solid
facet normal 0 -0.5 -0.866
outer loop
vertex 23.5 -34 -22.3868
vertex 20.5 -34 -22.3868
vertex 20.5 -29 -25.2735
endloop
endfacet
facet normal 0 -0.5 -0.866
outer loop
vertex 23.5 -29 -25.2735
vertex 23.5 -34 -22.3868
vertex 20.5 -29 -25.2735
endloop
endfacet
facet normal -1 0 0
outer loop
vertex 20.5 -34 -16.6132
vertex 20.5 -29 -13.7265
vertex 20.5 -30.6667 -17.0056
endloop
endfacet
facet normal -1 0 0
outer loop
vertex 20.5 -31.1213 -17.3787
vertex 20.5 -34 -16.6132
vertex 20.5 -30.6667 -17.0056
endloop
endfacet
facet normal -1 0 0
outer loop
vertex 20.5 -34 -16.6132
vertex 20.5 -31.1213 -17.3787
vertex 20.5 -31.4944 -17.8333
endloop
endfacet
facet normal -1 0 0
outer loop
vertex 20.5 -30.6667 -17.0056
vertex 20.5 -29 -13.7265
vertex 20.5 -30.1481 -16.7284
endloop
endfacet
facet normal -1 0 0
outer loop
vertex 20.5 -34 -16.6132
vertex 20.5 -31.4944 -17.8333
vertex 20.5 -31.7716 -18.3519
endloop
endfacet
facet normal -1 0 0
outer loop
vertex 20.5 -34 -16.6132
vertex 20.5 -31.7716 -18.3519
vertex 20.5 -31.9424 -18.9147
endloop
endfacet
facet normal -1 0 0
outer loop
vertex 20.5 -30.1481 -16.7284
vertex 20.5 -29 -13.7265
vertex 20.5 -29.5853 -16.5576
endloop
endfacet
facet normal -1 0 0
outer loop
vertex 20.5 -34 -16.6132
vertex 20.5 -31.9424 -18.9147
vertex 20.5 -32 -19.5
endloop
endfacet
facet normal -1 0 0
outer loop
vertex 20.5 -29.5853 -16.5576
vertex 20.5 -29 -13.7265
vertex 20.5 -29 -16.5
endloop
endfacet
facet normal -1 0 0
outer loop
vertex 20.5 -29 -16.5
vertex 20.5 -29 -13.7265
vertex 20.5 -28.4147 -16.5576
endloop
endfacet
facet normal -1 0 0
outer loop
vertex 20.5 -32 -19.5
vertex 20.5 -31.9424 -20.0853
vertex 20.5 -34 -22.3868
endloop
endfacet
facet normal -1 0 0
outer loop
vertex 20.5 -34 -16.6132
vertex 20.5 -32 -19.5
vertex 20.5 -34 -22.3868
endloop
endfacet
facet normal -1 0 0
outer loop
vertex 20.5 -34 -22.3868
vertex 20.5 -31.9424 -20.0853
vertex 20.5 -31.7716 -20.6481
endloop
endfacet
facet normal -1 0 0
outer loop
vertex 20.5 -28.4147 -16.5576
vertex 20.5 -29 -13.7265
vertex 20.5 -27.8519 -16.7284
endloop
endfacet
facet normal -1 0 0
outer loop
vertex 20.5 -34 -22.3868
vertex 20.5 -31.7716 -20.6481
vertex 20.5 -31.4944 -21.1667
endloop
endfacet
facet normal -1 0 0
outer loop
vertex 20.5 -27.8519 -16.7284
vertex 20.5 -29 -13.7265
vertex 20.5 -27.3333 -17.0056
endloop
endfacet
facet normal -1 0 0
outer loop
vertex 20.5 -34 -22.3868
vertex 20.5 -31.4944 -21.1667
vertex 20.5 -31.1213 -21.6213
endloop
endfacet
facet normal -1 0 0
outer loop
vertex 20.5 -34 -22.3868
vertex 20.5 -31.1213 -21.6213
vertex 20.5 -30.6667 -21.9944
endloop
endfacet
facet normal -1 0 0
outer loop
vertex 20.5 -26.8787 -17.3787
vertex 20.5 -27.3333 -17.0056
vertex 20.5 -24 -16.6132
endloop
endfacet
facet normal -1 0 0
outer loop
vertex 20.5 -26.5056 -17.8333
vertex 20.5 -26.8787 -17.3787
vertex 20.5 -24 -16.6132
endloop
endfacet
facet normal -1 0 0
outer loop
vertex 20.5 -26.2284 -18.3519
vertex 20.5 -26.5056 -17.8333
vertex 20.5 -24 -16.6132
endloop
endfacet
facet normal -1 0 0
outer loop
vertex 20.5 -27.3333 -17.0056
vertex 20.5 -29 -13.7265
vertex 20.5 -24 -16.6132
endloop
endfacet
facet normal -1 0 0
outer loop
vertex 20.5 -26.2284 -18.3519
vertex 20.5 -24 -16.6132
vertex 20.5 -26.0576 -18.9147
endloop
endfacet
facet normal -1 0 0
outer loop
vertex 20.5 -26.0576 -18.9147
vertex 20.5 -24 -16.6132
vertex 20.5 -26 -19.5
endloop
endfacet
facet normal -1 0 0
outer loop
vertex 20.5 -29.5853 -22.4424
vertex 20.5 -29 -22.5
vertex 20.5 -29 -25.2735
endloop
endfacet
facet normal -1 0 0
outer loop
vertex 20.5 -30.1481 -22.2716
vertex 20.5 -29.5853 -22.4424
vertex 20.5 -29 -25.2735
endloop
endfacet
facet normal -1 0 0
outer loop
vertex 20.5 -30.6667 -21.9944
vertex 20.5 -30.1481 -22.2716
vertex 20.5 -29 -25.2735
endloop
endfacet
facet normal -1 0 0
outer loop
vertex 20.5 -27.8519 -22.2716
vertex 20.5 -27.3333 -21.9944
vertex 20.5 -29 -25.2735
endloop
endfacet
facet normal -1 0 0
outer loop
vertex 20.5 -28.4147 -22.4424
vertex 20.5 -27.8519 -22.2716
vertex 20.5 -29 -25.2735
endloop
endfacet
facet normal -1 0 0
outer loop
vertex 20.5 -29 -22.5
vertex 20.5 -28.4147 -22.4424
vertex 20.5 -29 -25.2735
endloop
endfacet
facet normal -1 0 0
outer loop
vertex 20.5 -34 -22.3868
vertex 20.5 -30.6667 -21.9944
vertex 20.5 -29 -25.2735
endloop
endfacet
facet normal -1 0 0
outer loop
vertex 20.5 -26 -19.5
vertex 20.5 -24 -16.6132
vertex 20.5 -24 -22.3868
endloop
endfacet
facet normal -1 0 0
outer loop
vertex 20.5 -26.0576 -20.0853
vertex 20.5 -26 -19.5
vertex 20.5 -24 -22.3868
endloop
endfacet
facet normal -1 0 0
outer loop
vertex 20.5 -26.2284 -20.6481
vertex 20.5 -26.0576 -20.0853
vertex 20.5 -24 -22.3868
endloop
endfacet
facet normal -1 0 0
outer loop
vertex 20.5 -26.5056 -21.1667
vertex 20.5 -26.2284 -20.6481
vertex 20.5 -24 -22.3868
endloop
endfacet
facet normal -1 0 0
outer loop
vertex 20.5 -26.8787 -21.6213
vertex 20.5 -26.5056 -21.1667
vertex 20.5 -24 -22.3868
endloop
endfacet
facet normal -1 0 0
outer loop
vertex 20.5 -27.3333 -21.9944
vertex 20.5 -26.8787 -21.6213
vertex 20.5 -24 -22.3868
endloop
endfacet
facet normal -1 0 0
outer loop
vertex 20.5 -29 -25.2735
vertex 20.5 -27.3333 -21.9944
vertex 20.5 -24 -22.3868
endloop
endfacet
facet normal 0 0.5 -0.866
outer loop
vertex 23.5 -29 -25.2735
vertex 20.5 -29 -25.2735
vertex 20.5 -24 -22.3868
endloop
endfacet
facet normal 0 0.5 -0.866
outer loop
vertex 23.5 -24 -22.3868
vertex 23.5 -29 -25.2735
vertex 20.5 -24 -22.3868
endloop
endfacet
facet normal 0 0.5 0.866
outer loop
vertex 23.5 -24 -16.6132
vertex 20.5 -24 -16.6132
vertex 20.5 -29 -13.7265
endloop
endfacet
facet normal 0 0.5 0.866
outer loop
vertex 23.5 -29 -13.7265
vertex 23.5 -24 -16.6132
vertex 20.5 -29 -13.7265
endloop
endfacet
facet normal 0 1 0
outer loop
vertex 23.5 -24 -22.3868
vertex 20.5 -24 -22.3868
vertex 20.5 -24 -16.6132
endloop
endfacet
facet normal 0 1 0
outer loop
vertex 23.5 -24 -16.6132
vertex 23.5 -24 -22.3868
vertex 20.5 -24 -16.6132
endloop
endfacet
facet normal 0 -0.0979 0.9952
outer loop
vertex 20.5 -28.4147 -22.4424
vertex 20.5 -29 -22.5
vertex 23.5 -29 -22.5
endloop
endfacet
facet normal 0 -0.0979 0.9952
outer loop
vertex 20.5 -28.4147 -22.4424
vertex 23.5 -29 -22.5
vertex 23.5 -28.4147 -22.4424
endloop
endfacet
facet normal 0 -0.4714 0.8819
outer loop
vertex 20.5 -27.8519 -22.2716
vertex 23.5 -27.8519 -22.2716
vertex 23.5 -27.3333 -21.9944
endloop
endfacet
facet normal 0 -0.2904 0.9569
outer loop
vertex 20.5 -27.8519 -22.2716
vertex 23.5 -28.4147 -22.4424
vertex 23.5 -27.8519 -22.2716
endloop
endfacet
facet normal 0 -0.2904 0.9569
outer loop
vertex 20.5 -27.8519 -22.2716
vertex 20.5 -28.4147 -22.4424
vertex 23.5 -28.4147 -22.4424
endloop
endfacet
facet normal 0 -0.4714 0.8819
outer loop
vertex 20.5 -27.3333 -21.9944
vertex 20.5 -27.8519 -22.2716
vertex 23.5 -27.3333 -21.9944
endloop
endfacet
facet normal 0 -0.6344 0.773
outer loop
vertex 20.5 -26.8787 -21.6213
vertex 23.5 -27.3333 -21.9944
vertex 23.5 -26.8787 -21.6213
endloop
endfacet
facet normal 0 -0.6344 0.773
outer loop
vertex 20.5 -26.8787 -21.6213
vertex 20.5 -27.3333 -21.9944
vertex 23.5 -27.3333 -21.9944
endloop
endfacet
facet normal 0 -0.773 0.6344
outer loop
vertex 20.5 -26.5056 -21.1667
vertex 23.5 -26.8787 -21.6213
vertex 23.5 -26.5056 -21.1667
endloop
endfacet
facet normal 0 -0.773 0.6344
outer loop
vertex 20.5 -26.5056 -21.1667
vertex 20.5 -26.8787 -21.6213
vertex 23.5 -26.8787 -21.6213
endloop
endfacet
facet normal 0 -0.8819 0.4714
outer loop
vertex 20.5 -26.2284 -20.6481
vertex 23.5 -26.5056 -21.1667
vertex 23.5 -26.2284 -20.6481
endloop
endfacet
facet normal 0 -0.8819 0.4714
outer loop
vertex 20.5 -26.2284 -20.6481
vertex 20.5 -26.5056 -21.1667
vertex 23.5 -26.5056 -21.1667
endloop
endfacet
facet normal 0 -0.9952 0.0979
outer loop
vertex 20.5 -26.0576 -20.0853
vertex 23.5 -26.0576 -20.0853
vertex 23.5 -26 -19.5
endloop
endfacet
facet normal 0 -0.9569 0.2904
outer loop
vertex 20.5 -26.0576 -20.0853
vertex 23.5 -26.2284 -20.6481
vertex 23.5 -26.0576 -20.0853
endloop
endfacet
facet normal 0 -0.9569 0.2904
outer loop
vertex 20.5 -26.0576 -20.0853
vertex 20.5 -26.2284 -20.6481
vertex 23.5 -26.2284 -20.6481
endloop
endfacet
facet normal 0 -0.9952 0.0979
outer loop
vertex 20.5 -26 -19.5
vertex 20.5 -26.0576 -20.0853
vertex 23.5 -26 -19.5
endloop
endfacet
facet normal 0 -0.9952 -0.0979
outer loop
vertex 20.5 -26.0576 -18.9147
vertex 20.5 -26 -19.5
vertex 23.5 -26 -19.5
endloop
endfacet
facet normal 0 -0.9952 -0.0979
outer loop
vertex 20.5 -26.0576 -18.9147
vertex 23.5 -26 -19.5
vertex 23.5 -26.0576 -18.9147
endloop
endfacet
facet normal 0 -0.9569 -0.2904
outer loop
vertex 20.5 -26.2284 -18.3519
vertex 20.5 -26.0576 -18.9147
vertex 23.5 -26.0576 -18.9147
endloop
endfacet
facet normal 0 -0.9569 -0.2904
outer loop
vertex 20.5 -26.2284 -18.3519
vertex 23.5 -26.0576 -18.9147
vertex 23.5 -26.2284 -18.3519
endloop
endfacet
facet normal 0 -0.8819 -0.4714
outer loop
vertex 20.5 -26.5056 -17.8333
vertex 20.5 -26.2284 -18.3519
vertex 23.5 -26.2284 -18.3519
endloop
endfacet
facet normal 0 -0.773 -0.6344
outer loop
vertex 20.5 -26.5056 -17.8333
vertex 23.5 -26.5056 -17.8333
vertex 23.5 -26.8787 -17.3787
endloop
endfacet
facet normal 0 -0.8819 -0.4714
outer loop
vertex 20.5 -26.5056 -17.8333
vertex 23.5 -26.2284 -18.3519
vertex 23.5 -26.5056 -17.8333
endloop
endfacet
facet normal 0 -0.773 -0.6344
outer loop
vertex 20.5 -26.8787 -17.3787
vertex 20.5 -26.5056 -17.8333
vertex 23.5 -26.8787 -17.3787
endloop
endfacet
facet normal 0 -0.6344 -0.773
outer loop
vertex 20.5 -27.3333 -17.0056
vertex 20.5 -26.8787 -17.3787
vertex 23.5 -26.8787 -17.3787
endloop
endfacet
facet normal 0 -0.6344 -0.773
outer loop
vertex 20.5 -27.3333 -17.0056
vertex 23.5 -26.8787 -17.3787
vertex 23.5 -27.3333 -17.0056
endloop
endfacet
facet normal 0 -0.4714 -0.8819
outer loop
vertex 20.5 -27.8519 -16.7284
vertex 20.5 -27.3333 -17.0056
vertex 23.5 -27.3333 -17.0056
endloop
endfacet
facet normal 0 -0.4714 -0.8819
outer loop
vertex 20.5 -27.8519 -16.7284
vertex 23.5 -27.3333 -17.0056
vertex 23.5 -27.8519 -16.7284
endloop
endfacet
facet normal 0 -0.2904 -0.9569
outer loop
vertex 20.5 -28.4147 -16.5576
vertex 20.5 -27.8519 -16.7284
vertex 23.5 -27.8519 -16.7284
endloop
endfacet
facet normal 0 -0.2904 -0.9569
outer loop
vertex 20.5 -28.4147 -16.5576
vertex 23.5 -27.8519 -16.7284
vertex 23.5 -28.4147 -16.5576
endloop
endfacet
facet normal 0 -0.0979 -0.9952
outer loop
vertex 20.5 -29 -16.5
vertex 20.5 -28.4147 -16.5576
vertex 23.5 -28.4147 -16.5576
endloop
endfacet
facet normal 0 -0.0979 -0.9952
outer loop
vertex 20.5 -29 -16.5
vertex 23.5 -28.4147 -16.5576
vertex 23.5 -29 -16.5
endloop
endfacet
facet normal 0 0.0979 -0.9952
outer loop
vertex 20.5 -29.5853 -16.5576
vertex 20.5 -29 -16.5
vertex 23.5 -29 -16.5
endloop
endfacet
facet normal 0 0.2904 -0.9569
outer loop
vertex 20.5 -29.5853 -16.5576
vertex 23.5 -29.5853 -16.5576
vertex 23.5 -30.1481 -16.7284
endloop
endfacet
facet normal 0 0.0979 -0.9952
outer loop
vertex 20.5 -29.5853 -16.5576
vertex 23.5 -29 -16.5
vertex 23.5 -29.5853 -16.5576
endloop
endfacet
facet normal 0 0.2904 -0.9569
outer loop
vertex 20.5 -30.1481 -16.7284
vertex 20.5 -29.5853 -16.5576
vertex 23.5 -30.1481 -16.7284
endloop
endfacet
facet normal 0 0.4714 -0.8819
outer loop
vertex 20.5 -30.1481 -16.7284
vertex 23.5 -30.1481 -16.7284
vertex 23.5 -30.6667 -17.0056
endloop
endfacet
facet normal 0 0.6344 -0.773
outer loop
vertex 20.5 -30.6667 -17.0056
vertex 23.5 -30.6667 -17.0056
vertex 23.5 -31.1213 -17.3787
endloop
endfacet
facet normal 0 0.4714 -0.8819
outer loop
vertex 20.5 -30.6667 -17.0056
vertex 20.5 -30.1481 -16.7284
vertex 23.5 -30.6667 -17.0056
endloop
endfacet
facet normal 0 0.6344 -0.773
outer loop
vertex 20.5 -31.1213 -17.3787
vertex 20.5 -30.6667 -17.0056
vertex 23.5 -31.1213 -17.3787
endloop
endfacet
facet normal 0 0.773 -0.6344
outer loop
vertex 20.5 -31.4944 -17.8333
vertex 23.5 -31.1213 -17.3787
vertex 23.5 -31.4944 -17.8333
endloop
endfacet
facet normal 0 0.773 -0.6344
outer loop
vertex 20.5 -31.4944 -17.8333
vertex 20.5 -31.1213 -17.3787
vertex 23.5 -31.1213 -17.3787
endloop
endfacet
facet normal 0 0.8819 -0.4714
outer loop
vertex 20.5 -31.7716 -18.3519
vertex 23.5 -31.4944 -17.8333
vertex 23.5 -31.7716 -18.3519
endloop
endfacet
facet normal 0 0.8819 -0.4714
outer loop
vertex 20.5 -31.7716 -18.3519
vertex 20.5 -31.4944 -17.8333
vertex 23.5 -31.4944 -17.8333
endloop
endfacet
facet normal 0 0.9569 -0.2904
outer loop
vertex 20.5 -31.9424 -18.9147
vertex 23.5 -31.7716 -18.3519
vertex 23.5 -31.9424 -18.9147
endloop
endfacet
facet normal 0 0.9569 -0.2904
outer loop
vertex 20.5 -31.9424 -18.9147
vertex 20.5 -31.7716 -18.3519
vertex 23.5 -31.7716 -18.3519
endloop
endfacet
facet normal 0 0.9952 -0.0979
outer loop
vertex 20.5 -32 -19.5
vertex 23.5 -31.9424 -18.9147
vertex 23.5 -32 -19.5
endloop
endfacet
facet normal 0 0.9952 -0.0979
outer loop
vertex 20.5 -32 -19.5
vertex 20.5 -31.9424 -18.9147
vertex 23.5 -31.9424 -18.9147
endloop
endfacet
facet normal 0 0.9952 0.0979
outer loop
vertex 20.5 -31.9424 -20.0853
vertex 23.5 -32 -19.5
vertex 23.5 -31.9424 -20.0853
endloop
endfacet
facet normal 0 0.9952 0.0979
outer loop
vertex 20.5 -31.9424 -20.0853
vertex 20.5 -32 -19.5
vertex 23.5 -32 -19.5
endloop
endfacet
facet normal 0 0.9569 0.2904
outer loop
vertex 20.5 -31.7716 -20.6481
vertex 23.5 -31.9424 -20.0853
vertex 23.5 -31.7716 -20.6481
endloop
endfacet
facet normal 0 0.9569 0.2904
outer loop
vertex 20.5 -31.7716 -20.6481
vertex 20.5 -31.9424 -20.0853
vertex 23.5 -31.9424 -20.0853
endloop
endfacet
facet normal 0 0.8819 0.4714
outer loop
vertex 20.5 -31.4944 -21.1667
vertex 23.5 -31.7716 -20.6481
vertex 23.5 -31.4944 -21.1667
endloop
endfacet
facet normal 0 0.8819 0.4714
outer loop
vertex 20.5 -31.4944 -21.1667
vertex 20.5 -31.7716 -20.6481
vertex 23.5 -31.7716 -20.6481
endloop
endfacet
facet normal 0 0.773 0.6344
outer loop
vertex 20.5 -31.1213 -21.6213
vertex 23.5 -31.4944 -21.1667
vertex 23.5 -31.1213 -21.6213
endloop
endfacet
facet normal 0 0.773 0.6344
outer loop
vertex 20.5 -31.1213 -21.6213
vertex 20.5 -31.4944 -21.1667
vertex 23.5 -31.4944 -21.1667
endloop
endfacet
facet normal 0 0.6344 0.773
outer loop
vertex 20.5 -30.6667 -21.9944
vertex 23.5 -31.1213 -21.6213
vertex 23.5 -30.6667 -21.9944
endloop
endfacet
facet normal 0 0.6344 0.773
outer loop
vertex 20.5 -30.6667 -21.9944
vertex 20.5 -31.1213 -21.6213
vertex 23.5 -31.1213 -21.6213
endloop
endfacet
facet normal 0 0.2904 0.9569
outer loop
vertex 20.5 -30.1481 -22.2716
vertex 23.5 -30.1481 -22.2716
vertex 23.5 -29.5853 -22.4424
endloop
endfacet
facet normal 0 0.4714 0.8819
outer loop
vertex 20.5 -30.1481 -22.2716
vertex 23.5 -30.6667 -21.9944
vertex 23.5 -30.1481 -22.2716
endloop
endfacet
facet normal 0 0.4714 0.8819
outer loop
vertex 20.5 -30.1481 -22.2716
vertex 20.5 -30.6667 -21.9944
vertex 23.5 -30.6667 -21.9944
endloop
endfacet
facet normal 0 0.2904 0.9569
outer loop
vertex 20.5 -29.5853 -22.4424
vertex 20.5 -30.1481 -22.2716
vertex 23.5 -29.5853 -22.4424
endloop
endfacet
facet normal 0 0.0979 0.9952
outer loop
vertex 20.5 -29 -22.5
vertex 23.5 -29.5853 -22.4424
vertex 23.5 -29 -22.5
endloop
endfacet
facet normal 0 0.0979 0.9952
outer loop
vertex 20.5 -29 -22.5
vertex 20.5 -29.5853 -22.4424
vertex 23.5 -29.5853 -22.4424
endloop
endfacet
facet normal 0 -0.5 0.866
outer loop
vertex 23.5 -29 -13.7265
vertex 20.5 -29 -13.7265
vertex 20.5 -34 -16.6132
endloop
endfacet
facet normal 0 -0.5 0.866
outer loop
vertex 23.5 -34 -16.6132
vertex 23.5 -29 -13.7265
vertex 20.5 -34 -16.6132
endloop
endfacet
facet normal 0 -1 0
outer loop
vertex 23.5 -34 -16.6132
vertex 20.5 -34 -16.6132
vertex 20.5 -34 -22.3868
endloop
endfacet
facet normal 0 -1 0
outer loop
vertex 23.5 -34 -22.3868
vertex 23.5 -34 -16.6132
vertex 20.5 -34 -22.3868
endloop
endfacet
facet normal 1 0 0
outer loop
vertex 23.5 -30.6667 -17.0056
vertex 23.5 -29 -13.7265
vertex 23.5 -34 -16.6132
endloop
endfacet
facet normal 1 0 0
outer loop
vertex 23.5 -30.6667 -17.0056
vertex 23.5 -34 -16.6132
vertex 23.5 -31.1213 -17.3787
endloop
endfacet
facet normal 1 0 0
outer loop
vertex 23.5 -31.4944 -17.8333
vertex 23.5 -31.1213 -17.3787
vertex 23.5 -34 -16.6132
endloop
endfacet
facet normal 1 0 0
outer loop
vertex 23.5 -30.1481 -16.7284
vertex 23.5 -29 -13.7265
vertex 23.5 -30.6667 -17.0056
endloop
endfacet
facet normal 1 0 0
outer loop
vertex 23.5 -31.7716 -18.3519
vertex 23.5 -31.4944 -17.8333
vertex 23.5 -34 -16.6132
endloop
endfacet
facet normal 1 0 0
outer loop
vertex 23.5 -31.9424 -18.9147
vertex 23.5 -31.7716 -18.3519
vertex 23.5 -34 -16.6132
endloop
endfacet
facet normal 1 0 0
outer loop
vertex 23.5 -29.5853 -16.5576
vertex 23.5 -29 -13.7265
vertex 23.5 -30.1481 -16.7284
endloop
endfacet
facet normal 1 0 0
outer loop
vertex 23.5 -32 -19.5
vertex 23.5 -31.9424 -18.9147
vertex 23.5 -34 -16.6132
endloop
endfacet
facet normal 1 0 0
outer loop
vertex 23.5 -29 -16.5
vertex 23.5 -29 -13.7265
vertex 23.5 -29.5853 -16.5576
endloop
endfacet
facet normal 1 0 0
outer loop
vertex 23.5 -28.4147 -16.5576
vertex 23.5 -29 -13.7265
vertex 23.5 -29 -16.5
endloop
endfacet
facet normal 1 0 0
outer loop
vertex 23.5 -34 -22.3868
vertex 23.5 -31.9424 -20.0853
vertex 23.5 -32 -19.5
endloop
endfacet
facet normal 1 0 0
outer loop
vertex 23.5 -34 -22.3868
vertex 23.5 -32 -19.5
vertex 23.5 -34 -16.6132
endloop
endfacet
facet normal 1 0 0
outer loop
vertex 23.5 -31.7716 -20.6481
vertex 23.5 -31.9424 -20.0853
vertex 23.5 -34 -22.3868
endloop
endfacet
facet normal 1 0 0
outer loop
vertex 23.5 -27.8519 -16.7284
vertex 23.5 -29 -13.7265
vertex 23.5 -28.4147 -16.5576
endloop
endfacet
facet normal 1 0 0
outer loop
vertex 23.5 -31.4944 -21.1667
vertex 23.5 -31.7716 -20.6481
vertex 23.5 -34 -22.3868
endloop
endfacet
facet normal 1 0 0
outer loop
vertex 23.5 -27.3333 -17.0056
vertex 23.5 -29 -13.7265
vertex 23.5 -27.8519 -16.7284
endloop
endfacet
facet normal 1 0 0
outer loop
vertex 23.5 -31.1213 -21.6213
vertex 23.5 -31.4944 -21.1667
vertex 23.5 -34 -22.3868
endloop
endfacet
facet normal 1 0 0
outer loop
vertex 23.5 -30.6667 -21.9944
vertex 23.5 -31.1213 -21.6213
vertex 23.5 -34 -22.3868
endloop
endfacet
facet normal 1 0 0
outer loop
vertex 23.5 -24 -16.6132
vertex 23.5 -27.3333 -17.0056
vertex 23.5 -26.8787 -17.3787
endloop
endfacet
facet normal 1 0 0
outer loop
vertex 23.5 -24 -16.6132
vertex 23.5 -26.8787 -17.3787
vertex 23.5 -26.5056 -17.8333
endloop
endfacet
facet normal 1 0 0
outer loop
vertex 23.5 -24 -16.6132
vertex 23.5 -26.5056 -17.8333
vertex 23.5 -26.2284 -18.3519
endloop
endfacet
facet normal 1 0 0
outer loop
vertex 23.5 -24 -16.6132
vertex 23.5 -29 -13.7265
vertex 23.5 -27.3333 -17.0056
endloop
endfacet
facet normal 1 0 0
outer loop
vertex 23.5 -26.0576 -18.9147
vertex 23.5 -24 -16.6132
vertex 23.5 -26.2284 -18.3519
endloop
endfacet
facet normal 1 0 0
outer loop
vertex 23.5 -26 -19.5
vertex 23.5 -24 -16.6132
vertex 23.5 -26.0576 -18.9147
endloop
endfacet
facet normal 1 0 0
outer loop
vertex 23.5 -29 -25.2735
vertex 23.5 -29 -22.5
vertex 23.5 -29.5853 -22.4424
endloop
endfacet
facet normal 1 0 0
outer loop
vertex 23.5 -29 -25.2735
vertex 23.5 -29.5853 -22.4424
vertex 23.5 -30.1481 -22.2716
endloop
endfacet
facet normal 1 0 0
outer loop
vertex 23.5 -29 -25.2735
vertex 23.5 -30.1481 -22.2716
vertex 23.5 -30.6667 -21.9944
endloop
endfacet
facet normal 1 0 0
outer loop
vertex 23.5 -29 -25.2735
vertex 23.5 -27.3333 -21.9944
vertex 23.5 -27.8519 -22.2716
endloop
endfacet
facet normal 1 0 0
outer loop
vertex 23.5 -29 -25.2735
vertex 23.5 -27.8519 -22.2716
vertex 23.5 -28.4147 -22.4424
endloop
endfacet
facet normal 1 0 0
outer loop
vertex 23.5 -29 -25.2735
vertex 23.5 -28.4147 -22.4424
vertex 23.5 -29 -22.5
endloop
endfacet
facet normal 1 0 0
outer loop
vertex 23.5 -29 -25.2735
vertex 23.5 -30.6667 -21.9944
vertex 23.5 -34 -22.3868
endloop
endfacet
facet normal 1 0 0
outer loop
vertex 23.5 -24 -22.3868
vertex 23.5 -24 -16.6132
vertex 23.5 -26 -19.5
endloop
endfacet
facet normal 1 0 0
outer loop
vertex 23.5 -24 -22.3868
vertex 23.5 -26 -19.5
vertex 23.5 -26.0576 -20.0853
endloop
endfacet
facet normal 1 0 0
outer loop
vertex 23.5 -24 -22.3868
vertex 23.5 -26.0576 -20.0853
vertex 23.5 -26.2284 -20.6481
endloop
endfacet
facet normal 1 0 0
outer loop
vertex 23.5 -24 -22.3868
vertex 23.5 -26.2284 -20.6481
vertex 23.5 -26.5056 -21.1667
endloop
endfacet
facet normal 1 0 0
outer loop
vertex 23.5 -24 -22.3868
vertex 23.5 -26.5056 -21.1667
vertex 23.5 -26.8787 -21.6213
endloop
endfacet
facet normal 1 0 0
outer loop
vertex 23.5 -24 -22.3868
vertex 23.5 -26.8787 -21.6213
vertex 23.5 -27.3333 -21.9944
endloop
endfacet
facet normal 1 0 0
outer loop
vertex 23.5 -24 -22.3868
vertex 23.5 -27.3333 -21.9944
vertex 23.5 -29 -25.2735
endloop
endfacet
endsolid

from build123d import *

# Parameters (mm, degrees)
HEX_NUT_BLANK_DEPTH         = 3
M6_THREAD_ENVELOPE_SKETCH_R = 3
M6_THREAD_ENVELOPE_DEPTH    = 3.2


with BuildPart() as part:
    # Hex nut blank sketch → Hex nut blank (new body)
    with BuildSketch(Plane(origin=(20.5, 0, 0), x_dir=(0, 0, -1), z_dir=(1, 0, 0))):
        Polygon((16.613248654, -24), (13.726497308, -29), (16.613248654, -34), (22.386751346, -34), (25.273502692, -29), (22.386751346, -24), align=None)
    extrude(amount=HEX_NUT_BLANK_DEPTH)

    # M6 thread envelope sketch → M6 thread envelope (cut)
    with BuildSketch(Plane(origin=(20.4, 0, 0), x_dir=(0, 0, -1), z_dir=(1, 0, 0))):
        with Locations((19.5, -29)):
            Circle(M6_THREAD_ENVELOPE_SKETCH_R)
    extrude(amount=M6_THREAD_ENVELOPE_DEPTH, mode=Mode.SUBTRACT)


solid = part.part
